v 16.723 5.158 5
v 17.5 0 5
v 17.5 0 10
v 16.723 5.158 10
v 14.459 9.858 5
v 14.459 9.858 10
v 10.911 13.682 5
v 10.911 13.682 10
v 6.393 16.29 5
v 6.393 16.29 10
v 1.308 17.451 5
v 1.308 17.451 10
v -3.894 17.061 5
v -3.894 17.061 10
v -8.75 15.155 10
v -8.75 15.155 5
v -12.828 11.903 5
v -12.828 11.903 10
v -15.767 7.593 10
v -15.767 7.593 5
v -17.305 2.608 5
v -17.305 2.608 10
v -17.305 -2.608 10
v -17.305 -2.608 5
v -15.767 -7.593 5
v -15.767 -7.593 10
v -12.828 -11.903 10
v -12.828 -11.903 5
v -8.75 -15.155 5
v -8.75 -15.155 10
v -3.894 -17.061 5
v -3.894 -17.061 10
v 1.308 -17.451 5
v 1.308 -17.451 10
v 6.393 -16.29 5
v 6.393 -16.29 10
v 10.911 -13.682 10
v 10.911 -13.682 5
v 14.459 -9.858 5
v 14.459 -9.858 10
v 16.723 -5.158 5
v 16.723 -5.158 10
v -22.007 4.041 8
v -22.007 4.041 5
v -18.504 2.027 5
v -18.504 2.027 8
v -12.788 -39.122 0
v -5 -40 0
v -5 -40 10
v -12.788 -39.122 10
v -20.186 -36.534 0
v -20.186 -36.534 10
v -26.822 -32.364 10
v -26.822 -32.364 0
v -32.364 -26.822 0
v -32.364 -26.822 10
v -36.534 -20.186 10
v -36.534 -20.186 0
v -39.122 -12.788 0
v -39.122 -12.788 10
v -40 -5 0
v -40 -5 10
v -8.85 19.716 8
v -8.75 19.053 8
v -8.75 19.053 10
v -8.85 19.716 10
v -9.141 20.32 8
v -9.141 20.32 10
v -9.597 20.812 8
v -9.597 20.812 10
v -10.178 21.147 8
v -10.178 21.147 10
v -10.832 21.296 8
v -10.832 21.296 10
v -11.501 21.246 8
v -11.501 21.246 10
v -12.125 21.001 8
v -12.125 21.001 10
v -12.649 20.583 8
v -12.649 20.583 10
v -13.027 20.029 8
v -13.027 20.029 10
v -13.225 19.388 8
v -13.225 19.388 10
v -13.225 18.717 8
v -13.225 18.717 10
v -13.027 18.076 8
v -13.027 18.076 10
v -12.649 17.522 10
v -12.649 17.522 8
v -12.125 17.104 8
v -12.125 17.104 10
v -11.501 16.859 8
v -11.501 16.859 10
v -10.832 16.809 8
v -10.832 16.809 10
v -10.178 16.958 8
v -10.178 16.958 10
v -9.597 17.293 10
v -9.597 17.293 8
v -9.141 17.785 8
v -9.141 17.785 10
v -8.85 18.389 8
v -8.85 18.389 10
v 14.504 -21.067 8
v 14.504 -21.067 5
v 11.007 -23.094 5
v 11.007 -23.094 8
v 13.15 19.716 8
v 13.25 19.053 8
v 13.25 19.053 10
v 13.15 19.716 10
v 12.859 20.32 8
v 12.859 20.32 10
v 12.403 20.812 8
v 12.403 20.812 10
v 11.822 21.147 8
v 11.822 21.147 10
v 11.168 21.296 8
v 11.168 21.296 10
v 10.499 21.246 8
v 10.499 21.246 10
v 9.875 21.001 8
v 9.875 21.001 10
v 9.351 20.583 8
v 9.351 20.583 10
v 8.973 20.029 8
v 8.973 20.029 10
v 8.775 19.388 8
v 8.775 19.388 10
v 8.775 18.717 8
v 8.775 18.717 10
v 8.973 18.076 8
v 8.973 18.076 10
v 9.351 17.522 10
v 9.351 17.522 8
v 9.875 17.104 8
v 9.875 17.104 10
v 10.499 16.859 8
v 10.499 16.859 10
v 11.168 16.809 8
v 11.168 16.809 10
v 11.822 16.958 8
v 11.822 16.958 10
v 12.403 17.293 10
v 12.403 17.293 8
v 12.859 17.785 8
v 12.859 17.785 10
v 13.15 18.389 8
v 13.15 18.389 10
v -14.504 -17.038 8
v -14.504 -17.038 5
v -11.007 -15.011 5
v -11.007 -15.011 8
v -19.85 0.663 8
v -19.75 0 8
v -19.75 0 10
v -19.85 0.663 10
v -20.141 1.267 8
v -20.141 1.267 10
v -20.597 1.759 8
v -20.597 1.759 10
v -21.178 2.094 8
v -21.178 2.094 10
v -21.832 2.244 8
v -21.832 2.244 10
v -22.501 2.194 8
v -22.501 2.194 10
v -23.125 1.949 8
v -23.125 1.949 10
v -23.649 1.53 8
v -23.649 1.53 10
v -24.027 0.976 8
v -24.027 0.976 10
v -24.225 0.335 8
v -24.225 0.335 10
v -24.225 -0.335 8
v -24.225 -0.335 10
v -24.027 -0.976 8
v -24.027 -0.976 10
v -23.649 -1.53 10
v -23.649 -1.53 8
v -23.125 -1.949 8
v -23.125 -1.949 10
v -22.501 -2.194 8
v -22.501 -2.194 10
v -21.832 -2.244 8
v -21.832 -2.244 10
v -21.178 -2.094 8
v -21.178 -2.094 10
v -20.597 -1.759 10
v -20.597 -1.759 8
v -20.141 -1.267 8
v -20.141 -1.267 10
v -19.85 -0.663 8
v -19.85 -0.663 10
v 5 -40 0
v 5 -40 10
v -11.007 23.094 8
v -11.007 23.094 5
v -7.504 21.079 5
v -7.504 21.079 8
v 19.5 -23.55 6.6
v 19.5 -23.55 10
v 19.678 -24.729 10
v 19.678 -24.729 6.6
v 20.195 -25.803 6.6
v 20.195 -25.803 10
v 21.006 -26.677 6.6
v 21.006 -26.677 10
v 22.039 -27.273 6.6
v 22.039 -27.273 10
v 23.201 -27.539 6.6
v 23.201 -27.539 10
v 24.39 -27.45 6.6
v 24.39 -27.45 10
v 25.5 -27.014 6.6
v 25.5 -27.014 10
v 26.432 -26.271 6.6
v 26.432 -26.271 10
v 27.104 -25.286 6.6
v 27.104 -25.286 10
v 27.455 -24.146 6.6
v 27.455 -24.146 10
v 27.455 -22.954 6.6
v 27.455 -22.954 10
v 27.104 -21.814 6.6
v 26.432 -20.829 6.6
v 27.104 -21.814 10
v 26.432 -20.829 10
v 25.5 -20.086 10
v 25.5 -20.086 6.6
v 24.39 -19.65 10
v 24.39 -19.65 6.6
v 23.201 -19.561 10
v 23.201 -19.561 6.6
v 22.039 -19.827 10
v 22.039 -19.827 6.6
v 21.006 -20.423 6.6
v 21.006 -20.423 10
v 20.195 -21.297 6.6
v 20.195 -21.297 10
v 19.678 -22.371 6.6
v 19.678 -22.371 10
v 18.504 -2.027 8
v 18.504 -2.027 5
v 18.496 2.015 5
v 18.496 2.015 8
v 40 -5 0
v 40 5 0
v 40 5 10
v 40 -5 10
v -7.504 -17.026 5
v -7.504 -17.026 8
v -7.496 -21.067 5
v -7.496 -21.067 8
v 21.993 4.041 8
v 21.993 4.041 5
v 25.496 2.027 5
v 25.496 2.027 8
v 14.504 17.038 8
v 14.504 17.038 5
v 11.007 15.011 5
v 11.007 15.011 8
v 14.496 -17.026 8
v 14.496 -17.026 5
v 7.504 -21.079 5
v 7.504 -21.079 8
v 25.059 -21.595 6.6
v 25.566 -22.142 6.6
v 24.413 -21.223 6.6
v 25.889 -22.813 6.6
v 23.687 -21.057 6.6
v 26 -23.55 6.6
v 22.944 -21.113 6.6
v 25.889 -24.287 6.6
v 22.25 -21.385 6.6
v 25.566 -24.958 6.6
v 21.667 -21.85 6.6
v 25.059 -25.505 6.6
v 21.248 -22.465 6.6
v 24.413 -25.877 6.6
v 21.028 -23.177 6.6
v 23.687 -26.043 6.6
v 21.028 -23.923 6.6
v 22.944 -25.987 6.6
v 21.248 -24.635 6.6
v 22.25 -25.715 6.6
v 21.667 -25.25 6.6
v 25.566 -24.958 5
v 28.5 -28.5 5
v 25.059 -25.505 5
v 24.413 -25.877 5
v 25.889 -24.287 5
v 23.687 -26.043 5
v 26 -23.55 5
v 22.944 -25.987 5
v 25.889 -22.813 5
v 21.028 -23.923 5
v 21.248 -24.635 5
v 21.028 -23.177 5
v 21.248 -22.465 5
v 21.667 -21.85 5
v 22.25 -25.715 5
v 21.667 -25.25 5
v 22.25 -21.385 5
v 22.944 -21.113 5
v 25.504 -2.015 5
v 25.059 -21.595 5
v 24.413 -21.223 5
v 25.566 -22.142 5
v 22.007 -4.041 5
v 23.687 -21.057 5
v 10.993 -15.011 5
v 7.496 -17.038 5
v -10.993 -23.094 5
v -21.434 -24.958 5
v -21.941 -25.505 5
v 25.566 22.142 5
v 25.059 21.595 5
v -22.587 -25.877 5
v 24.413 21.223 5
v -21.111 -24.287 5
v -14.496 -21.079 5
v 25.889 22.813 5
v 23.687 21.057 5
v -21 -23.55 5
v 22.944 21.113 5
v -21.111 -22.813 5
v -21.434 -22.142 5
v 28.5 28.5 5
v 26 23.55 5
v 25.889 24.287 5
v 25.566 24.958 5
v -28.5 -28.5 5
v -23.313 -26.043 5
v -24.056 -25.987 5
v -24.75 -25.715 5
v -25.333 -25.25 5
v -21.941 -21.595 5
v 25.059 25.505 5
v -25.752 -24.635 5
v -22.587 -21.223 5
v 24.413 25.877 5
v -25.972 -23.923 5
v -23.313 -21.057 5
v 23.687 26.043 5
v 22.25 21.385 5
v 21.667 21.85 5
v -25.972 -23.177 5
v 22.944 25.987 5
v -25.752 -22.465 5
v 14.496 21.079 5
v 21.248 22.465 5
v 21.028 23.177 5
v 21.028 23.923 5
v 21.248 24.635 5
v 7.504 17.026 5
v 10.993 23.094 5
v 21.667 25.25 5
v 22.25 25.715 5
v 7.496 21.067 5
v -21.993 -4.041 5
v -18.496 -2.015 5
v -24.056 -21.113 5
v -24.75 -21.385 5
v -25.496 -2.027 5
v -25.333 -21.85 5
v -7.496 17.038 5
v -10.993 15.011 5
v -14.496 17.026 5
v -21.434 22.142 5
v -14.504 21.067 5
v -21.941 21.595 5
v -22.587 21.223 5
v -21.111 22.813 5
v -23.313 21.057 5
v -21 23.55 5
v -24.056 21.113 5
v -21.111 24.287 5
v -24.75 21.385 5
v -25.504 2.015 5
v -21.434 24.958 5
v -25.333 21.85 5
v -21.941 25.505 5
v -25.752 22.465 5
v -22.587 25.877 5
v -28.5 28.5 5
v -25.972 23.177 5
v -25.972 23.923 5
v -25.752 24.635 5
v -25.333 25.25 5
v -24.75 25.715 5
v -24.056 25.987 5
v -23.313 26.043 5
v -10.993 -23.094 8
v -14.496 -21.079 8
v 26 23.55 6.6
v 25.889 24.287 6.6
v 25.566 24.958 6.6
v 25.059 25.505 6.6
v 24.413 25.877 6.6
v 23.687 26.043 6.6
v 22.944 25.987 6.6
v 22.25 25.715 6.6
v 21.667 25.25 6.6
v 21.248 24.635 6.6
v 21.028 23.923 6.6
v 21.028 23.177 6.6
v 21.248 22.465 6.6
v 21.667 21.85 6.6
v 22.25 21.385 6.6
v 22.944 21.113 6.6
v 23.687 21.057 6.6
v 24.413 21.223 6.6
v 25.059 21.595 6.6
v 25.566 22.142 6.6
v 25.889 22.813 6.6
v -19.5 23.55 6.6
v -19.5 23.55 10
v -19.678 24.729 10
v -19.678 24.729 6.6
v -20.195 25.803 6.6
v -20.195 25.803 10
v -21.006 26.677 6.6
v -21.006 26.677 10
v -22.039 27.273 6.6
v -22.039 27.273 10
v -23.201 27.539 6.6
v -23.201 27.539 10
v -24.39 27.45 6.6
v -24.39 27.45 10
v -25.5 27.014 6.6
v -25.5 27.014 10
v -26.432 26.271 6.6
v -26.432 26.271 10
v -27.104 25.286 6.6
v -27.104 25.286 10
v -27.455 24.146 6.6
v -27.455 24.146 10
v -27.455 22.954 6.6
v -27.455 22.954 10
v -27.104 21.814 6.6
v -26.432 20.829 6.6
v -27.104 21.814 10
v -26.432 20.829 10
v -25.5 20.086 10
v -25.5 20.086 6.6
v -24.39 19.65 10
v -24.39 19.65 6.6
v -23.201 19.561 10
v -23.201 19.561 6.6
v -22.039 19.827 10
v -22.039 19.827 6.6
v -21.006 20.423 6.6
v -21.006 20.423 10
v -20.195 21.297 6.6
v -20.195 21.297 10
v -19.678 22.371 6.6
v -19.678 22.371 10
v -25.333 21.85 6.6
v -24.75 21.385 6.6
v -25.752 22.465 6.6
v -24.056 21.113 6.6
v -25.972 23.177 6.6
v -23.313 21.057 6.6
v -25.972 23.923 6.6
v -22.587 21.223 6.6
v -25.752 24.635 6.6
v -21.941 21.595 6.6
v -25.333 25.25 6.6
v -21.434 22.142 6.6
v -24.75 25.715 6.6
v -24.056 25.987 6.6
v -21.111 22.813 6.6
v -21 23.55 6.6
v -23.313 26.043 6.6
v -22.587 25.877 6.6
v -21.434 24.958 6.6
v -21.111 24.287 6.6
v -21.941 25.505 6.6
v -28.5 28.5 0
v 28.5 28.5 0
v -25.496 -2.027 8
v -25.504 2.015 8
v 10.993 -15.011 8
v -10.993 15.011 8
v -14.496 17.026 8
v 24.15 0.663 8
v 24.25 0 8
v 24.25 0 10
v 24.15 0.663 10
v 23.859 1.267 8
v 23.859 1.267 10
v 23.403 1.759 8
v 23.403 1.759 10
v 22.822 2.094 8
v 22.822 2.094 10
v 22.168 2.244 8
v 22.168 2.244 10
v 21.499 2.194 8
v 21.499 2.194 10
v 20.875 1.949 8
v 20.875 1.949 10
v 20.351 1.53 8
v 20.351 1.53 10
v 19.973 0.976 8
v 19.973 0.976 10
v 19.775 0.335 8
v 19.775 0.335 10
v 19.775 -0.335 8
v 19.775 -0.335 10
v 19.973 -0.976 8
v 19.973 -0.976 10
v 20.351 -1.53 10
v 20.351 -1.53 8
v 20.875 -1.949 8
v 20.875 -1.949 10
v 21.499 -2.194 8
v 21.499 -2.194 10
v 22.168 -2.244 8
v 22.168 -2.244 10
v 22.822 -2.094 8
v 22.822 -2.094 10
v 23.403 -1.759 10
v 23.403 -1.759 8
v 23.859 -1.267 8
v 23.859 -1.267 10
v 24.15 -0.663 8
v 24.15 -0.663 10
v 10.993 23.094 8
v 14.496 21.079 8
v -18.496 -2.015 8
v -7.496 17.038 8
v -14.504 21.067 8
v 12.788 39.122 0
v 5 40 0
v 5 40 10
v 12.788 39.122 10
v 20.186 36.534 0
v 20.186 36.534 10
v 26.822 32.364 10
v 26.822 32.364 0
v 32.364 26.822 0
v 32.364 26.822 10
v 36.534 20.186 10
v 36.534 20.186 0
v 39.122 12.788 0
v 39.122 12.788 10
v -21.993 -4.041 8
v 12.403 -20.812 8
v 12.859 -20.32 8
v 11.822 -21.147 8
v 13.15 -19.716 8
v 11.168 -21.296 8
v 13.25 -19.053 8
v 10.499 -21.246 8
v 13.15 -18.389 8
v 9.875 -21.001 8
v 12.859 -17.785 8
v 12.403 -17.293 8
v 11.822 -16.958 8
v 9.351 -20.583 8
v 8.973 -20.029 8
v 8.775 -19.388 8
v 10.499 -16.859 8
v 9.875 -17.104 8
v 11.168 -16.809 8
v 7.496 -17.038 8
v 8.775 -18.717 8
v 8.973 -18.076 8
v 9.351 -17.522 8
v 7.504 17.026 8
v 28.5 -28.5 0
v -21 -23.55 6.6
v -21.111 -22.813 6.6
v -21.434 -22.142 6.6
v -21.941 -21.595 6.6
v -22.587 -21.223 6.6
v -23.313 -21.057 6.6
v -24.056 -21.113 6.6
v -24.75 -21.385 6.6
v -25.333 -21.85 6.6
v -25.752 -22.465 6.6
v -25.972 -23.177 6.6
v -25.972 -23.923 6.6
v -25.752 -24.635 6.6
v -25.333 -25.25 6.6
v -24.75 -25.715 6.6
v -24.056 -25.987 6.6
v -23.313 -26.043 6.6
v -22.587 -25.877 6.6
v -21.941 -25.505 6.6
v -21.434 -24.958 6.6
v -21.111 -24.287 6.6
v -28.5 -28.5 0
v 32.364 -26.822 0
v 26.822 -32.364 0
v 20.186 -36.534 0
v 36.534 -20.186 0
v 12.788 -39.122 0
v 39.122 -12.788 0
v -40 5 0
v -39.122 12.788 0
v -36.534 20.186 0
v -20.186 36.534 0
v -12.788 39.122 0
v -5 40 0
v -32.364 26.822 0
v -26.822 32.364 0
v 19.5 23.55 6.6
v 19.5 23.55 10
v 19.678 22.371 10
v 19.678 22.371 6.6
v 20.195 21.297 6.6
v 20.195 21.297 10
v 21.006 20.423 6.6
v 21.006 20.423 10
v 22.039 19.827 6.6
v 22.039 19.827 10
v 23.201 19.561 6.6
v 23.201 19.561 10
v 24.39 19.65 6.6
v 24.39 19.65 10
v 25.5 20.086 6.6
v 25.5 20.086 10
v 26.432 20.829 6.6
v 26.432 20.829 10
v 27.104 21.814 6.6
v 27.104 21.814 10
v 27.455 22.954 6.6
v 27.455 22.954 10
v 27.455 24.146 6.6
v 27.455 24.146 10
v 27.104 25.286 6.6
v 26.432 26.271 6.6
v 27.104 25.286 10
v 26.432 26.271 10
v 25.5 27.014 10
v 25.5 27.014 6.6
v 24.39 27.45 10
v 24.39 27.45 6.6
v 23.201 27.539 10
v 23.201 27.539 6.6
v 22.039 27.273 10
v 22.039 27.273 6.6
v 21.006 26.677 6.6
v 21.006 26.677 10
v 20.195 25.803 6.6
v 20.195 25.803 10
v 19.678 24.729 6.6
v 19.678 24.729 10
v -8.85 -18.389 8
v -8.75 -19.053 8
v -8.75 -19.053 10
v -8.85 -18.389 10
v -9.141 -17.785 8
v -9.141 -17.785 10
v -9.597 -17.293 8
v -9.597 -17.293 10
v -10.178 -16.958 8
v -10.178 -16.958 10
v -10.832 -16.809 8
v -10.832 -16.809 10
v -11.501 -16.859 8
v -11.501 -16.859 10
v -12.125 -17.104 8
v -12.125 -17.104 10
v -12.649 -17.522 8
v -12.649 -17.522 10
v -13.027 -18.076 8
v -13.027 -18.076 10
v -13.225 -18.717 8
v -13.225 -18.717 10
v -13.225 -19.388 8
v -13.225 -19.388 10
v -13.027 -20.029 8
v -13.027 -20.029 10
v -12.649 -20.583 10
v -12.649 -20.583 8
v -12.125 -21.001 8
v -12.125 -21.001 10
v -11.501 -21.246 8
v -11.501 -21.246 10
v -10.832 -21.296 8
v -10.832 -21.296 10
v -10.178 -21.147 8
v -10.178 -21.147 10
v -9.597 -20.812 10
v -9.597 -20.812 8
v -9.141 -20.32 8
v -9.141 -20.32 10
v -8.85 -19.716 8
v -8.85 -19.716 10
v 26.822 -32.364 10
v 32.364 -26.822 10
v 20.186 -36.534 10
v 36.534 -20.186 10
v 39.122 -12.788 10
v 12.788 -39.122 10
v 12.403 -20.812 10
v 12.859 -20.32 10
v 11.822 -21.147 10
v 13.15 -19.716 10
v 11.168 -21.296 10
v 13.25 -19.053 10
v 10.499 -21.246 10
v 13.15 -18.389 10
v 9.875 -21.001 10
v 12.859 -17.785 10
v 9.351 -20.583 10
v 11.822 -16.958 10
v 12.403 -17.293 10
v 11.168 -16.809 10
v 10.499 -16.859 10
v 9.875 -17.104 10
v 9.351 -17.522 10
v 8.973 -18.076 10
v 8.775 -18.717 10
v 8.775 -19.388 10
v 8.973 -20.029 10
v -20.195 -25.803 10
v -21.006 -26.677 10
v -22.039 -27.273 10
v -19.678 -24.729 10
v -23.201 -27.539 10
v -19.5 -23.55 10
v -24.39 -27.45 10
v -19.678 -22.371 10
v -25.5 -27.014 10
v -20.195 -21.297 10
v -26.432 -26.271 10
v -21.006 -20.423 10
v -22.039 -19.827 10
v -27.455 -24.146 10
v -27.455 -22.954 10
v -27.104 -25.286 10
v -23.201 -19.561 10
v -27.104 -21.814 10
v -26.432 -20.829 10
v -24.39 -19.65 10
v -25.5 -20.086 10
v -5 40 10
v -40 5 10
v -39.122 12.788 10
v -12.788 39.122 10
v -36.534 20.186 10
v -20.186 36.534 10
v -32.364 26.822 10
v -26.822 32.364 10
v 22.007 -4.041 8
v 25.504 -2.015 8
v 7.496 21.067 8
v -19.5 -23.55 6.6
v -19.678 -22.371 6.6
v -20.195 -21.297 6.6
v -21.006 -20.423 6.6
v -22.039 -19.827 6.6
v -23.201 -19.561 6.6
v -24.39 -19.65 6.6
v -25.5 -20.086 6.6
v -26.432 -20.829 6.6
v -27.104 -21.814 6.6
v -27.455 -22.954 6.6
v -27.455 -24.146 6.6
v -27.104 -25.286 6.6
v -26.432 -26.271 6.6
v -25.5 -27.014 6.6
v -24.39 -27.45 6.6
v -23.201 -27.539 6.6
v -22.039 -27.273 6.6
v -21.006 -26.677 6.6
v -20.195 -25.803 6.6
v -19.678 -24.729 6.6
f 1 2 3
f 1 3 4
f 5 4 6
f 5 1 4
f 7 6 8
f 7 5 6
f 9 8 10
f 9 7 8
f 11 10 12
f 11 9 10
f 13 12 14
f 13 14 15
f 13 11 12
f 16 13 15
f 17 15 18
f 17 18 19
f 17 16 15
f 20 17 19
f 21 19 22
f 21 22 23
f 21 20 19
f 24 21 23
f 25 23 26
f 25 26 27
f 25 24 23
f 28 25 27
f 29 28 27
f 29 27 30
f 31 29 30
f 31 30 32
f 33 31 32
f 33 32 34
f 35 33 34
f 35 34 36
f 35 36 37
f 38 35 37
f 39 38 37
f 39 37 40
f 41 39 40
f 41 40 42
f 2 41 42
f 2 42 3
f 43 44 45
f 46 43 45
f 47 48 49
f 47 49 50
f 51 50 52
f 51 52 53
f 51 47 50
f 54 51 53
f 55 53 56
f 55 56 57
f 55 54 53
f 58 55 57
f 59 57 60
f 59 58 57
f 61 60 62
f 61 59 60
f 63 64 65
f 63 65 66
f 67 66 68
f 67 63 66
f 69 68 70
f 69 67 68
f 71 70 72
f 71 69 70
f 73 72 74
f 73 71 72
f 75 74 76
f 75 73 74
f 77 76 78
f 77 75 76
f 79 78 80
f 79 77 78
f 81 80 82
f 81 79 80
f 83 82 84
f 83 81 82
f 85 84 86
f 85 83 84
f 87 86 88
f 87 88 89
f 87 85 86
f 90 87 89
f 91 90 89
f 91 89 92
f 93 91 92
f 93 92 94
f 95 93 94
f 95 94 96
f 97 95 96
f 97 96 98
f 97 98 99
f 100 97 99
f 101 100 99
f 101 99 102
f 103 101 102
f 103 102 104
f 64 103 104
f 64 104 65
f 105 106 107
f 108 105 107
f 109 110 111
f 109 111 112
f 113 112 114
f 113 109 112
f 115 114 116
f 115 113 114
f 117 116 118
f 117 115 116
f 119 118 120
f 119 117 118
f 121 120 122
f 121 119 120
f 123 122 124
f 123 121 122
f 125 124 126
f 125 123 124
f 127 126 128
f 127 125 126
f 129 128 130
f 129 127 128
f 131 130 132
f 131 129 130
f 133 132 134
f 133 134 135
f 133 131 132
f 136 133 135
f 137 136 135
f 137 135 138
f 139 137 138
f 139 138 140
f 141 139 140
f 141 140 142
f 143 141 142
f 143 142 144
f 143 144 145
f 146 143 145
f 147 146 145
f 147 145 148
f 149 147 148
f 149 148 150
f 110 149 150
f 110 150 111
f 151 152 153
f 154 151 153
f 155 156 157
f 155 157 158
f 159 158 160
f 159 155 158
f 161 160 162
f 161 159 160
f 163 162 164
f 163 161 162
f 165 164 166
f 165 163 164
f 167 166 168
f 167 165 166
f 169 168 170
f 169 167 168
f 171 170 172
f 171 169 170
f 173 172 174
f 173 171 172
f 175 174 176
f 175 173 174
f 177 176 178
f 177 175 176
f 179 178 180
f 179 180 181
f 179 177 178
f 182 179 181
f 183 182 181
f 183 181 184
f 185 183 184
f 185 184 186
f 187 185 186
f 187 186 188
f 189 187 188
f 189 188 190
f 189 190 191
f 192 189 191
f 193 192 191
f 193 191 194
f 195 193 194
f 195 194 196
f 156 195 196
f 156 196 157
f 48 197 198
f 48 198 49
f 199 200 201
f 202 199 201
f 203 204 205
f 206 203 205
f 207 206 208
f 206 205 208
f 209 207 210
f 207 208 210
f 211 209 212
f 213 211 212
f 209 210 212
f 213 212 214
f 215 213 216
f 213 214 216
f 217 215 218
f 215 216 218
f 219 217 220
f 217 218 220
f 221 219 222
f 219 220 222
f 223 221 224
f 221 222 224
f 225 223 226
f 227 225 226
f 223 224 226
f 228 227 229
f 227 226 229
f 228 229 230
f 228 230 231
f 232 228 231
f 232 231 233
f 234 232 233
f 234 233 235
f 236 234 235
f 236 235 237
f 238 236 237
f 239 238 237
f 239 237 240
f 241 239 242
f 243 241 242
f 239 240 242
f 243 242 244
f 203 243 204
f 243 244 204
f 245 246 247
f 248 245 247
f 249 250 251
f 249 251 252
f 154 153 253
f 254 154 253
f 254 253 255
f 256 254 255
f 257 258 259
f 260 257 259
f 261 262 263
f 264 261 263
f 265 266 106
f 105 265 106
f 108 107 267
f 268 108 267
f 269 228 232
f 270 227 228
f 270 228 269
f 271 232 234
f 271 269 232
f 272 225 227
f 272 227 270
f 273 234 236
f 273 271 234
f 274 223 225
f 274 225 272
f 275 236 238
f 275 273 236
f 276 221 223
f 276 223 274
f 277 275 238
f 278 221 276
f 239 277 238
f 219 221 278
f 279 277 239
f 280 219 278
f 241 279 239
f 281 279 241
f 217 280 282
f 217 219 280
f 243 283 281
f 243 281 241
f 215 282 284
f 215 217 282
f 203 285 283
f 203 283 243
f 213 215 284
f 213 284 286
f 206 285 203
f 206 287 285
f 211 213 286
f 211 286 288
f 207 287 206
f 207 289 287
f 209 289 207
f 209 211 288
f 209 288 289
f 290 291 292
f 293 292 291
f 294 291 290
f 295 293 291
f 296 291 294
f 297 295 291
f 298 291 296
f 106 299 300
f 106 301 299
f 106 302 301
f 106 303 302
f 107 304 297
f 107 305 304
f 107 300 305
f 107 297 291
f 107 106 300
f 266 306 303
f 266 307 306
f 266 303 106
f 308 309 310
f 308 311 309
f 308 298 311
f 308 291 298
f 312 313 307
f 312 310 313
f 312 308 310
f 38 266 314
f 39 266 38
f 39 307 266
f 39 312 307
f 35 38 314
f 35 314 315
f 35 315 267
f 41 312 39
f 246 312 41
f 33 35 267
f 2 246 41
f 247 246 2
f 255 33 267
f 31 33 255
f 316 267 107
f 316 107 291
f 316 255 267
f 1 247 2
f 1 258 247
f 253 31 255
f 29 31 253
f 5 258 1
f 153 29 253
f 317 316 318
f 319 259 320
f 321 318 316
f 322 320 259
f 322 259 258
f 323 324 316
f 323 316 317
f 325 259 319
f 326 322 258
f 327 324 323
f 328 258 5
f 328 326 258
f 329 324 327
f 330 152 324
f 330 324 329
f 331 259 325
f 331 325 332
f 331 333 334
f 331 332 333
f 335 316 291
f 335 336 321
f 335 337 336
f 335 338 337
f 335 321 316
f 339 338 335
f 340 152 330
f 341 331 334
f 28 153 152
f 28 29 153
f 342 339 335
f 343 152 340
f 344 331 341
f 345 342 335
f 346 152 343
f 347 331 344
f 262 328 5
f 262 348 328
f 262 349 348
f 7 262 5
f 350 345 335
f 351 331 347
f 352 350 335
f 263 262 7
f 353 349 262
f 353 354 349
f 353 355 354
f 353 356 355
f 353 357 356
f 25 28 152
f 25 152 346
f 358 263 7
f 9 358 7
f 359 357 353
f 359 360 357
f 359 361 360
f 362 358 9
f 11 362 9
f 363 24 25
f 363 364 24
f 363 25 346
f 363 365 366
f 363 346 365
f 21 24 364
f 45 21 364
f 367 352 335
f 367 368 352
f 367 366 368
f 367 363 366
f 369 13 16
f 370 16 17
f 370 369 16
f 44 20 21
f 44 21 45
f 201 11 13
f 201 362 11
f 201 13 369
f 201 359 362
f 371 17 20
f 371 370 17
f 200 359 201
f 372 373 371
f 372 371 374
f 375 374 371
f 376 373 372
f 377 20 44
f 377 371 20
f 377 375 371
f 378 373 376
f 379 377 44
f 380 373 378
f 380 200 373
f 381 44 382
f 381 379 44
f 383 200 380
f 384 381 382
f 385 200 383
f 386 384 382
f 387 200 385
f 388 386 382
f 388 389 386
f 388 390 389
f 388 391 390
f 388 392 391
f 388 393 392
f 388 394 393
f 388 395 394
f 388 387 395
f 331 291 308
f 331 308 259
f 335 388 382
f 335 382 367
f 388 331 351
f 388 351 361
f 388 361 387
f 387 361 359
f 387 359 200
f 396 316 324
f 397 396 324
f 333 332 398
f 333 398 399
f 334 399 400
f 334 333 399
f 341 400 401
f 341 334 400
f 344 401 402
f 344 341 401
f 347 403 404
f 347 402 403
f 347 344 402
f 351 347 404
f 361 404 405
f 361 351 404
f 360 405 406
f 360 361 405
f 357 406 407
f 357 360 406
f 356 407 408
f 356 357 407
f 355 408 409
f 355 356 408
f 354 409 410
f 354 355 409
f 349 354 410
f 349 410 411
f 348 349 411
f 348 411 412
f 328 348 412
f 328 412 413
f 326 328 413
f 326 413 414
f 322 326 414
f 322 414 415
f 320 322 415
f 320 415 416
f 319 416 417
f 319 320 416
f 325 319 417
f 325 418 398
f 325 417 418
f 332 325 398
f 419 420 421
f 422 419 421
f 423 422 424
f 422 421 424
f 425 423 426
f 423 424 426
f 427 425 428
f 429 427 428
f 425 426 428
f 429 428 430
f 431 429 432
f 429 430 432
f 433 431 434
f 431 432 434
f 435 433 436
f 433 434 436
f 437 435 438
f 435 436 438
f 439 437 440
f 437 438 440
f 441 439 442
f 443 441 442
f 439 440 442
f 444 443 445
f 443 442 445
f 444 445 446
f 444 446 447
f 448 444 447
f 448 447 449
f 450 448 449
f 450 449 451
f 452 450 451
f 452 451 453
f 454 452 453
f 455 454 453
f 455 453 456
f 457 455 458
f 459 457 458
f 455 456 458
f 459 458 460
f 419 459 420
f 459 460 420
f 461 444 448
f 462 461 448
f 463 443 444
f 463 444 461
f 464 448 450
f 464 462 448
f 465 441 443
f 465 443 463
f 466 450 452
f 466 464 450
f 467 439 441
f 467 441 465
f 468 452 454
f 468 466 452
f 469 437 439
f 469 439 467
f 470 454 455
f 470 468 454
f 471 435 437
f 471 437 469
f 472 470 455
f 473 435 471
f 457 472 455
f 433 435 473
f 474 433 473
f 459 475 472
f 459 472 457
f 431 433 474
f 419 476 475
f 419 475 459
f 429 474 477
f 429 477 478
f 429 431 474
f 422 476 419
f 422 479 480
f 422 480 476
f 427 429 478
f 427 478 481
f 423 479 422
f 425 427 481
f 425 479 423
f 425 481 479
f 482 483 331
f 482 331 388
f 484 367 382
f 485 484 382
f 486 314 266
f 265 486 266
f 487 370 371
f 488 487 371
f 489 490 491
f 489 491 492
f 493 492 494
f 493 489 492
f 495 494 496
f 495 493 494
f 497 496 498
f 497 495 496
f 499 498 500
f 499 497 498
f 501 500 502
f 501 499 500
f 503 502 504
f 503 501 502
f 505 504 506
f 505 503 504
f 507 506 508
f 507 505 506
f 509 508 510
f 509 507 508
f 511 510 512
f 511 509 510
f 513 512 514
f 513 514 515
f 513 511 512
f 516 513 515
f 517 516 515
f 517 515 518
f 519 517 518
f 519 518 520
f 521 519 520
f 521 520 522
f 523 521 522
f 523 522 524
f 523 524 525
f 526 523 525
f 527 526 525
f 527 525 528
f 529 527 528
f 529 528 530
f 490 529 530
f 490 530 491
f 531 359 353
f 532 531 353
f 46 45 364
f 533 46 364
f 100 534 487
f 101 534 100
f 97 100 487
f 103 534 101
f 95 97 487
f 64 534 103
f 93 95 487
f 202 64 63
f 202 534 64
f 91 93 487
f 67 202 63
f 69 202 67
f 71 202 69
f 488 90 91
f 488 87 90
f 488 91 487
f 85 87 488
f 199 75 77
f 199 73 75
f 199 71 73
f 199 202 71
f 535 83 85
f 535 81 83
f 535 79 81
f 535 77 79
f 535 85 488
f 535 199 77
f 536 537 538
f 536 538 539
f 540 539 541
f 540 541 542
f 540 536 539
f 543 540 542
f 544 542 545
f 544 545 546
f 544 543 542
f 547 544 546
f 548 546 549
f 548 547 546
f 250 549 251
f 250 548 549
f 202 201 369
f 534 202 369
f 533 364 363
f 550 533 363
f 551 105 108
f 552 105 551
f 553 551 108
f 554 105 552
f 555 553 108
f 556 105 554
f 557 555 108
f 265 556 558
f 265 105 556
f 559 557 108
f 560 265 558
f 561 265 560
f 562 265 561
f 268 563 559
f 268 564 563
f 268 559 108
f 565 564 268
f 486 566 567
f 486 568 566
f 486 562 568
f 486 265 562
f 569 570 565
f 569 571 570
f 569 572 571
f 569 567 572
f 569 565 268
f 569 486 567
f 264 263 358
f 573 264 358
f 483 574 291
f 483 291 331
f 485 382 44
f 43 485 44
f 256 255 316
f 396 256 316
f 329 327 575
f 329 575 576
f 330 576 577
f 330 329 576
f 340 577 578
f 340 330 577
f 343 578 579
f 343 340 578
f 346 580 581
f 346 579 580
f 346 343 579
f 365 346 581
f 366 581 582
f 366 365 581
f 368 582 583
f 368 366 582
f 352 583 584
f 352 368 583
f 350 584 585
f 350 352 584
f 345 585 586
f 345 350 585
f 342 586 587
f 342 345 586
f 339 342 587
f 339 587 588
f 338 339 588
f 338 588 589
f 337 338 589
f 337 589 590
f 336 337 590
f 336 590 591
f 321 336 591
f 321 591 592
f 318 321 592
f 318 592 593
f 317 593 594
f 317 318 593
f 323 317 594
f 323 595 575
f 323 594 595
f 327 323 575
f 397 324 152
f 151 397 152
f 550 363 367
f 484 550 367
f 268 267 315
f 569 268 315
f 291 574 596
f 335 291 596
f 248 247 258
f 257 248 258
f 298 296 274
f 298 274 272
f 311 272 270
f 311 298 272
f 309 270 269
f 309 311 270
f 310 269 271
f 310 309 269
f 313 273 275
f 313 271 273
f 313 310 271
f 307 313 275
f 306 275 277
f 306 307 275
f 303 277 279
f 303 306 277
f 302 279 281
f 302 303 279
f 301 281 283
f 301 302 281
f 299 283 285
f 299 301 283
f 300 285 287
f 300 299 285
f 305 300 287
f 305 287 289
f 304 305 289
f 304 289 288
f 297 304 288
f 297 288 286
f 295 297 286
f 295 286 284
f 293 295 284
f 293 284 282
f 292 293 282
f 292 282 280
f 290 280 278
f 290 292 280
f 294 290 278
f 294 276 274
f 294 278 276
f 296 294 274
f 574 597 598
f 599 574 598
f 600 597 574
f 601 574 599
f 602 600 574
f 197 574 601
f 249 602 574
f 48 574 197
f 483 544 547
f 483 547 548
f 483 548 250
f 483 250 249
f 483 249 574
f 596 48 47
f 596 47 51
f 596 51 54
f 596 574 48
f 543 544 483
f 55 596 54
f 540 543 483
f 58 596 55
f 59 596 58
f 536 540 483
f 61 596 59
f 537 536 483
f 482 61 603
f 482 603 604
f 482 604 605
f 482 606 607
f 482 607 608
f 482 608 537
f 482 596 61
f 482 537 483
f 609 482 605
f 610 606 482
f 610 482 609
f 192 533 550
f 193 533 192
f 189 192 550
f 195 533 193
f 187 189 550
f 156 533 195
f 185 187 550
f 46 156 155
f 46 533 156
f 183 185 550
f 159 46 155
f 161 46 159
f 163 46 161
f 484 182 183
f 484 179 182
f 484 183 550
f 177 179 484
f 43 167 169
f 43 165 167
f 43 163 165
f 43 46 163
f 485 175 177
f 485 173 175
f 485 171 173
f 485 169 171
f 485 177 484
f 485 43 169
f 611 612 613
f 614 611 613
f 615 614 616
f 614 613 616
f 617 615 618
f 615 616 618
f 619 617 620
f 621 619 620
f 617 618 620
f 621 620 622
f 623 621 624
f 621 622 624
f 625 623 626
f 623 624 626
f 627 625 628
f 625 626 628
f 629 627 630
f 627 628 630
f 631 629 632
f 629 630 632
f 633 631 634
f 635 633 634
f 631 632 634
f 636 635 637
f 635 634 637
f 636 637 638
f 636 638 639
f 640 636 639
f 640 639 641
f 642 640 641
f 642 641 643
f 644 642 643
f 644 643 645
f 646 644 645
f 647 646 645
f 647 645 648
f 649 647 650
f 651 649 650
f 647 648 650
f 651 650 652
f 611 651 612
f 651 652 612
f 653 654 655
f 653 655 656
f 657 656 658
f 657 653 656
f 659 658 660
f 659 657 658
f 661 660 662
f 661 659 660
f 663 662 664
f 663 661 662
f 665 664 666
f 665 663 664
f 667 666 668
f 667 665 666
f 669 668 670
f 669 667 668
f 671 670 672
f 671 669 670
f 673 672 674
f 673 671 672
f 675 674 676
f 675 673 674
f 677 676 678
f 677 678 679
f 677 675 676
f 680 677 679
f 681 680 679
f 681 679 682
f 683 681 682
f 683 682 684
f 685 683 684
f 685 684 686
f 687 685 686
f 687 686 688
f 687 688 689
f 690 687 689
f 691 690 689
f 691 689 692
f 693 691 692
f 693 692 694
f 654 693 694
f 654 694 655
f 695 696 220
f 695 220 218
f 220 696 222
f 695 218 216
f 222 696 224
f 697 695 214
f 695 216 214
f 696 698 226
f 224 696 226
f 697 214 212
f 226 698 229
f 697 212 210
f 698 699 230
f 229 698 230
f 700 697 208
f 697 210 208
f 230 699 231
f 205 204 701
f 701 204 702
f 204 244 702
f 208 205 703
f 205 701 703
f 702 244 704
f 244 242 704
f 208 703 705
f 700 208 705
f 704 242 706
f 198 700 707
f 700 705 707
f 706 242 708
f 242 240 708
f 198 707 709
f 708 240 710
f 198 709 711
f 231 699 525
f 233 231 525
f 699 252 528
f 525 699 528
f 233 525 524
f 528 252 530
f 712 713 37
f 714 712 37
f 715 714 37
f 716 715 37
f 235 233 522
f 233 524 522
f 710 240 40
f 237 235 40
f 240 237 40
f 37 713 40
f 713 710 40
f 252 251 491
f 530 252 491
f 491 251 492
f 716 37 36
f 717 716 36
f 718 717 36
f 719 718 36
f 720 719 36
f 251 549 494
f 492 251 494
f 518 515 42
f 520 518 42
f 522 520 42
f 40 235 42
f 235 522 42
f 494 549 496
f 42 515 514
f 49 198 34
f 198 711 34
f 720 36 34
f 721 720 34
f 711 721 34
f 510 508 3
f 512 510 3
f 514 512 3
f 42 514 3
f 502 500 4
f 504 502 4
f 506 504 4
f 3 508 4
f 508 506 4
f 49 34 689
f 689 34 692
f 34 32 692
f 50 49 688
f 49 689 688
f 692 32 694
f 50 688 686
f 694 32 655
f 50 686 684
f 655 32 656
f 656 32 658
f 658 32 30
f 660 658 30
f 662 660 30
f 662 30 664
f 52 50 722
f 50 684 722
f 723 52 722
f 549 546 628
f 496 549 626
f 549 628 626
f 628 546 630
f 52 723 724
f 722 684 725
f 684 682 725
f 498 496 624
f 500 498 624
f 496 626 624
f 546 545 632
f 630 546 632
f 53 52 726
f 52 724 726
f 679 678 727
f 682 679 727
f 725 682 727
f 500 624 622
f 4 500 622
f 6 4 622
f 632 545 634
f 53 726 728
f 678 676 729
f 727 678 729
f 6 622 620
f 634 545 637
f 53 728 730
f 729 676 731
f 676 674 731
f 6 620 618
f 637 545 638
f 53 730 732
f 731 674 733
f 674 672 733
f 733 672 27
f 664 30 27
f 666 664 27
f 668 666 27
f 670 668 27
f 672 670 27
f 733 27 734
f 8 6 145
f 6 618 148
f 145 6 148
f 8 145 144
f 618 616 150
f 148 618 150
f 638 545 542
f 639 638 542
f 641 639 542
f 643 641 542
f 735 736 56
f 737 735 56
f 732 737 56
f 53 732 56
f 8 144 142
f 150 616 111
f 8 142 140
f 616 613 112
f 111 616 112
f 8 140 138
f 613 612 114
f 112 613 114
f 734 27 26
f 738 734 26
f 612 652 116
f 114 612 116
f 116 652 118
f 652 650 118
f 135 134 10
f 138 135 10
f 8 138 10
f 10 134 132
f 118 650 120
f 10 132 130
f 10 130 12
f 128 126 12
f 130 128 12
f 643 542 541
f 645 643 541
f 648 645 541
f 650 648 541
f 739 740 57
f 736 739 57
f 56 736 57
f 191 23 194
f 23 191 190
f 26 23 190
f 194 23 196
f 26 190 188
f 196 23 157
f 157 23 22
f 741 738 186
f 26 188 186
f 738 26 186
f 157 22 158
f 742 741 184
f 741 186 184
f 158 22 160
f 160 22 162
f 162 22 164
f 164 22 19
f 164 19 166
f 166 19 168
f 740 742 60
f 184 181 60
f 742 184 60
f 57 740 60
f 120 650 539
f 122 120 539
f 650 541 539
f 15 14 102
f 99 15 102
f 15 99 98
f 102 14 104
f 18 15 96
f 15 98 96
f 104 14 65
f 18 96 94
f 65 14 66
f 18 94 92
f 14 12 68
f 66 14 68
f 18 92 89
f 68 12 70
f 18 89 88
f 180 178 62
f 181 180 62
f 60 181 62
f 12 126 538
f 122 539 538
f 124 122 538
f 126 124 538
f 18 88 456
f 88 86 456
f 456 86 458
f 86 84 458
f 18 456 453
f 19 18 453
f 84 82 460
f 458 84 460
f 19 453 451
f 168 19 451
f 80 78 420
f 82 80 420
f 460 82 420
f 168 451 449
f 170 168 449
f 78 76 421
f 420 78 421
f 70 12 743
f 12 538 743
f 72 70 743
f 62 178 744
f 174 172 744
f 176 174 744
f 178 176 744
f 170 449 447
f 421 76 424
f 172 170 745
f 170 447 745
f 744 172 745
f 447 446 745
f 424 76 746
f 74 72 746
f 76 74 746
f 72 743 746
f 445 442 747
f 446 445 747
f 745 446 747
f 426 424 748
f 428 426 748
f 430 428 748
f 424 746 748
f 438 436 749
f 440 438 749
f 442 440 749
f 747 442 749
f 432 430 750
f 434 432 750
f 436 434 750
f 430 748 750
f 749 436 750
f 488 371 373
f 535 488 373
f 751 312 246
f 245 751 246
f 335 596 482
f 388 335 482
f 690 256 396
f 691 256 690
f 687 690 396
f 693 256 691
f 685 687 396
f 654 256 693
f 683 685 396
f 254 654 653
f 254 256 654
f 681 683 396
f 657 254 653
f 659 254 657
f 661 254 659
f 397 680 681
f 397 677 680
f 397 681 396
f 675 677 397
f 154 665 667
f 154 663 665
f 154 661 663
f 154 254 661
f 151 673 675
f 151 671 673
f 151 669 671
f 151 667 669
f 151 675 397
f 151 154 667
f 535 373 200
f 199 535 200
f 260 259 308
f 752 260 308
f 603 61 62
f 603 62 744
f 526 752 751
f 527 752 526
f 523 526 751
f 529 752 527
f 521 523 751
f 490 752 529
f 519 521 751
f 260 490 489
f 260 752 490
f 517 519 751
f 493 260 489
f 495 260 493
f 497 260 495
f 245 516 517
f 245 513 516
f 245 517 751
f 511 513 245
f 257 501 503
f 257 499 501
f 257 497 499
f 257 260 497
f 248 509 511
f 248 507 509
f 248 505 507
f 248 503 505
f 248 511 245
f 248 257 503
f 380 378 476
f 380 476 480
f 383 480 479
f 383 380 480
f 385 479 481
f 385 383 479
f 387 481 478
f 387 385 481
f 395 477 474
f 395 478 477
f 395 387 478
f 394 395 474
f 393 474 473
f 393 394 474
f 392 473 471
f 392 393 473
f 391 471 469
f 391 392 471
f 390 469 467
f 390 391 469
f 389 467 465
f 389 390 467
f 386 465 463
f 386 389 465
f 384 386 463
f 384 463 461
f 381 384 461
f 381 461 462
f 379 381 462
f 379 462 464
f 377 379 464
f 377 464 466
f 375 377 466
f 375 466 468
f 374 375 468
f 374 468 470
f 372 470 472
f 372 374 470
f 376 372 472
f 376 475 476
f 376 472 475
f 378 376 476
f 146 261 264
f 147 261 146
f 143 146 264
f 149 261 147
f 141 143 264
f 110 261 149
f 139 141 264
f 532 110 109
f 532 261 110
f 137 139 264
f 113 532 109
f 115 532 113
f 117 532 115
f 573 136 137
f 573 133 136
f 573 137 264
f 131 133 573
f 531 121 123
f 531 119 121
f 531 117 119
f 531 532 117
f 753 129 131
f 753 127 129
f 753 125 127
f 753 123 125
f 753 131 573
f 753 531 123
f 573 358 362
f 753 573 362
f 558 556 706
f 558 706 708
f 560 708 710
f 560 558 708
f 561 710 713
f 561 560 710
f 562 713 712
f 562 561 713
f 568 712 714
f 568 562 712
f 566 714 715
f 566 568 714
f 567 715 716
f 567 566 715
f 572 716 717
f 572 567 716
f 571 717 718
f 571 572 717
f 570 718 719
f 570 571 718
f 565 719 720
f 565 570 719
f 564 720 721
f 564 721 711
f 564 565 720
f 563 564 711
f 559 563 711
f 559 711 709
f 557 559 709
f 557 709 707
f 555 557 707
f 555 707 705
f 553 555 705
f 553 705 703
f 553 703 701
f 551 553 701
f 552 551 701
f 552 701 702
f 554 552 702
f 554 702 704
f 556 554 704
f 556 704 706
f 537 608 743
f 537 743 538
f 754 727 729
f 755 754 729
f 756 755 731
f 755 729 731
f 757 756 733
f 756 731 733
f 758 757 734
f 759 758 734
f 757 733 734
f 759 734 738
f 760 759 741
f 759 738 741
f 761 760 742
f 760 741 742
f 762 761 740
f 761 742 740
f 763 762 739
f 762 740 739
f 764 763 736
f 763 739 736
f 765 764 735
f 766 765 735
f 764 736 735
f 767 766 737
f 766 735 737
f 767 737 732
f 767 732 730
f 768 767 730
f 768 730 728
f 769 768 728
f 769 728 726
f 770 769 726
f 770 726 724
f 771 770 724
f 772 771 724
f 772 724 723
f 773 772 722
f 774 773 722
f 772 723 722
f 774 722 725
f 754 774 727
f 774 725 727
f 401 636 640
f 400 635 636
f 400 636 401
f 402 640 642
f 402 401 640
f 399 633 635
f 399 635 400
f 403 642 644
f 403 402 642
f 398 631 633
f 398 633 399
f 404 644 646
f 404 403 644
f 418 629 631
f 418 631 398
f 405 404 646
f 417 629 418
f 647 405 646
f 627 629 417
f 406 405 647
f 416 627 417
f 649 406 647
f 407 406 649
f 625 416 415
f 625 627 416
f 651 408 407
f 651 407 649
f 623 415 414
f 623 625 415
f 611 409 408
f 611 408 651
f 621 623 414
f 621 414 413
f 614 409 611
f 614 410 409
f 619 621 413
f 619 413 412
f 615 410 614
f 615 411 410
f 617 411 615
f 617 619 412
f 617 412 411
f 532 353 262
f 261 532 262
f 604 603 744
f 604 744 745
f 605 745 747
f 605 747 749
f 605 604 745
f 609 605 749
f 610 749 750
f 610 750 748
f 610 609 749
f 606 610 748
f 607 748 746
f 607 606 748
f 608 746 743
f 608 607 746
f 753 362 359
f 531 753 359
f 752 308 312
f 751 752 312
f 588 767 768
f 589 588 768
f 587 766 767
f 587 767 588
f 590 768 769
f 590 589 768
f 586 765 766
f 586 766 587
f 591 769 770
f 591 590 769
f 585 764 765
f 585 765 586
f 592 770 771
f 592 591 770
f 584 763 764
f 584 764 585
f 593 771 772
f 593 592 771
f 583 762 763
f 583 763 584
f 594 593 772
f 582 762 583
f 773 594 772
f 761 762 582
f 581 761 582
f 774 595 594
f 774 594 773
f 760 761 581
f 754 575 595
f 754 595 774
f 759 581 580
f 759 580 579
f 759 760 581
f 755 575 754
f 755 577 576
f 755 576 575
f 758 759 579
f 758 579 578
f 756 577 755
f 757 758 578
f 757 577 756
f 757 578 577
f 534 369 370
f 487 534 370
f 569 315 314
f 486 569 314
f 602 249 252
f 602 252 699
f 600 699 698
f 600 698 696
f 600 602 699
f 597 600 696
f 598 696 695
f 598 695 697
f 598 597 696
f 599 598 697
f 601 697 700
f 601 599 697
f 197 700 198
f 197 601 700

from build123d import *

# Parameters (mm, degrees)
ESQUISSE1_R             = 2.25
ESQUISSE1_R_2           = 2.5
ESQUISSE1_R_3           = 17.5
BOSS_EXTRU_1_DEPTH      = 10
ESQUISSE2_W             = 57
ESQUISSE2_H             = 57
ENL_V_MAT_EXTRU_2_DEPTH = 5
ENL_V_MAT_EXTRU_3_DEPTH = 3
ESQUISSE5_R             = 4
ENL_V_MAT_EXTRU_4_DEPTH = 3.4


with BuildPart() as part:
    # Esquisse1 → Boss.-Extru.1 (new body)
    with BuildSketch(Plane.XY):
        with BuildLine():
            Line((5, -40), (-5, -40))
            ThreePointArc((-5, -40), (-29.748737342, -29.748737342), (-40, -5))
            Line((-40, -5), (-40, 5))
            ThreePointArc((-40, 5), (-29.748737342, 29.748737342), (-5, 40))
            Line((-5, 40), (5, 40))
            ThreePointArc((5, 40), (29.748737342, 29.748737342), (40, 5))
            Line((40, 5), (40, -5))
            ThreePointArc((40, -5), (29.748737342, -29.748737342), (5, -40))
        make_face()
        with Locations((22, 0)):
            Circle(ESQUISSE1_R, mode=Mode.SUBTRACT)
        with Locations((11, -19.052558883)):
            Circle(ESQUISSE1_R, mode=Mode.SUBTRACT)
        with Locations((-11, -19.052558883)):
            Circle(ESQUISSE1_R, mode=Mode.SUBTRACT)
        with Locations((-22, 0)):
            Circle(ESQUISSE1_R, mode=Mode.SUBTRACT)
        with Locations((-11, 19.052558883)):
            Circle(ESQUISSE1_R, mode=Mode.SUBTRACT)
        with Locations((11, 19.052558883)):
            Circle(ESQUISSE1_R, mode=Mode.SUBTRACT)
        with Locations((-23.5, 23.55)):
            Circle(ESQUISSE1_R_2, mode=Mode.SUBTRACT)
        with Locations((23.5, 23.55)):
            Circle(ESQUISSE1_R_2, mode=Mode.SUBTRACT)
        with Locations((23.5, -23.55)):
            Circle(ESQUISSE1_R_2, mode=Mode.SUBTRACT)
        with Locations((-23.5, -23.55)):
            Circle(ESQUISSE1_R_2, mode=Mode.SUBTRACT)
        Circle(ESQUISSE1_R_3, mode=Mode.SUBTRACT)
    extrude(amount=BOSS_EXTRU_1_DEPTH)

    # Esquisse2 → Enlèv. mat.-Extru.2 (cut)
    with BuildSketch(Plane(origin=(0, 0, 0), x_dir=(-1, 0, 0), z_dir=(0, 0, -1))):
        Rectangle(ESQUISSE2_W, ESQUISSE2_H)
    extrude(amount=-ENL_V_MAT_EXTRU_2_DEPTH, mode=Mode.SUBTRACT)

    # Esquisse4 → Enlèv. mat.-Extru.3 (cut)
    with BuildSketch(Plane(origin=(0, 0, 5), x_dir=(-1, 0, 0), z_dir=(0, 0, -1))):
        Polygon((-7.496491289, 21.067207559), (-10.992982578, 23.094010768), (-14.496491289, 21.079362091), (-14.503508711, 17.037910207), (-11.007017422, 15.011106999), (-7.503508711, 17.025755675), align=None)
        Polygon((14.496491289, 17.025755675), (14.503508711, 21.067207559), (11.007017422, 23.094010768), (7.503508711, 21.079362091), (7.496491289, 17.037910207), (10.992982578, 15.011106999), align=None)
        Polygon((21.992982578, -4.041451884), (25.496491289, -2.026803208), (25.503508711, 2.014648676), (22.007017422, 4.041451884), (18.503508711, 2.026803208), (18.496491289, -2.014648676), align=None)
        Polygon((7.496491289, -21.067207559), (10.992982578, -23.094010768), (14.496491289, -21.079362091), (14.503508711, -17.037910207), (11.007017422, -15.011106999), (7.503508711, -17.025755675), align=None)
        Polygon((-14.496491289, -17.025755675), (-14.503508711, -21.067207559), (-11.007017422, -23.094010768), (-7.503508711, -21.079362091), (-7.496491289, -17.037910207), (-10.992982578, -15.011106999), align=None)
        Polygon((-21.992982578, 4.041451884), (-25.496491289, 2.026803208), (-25.503508711, -2.014648676), (-22.007017422, -4.041451884), (-18.503508711, -2.026803208), (-18.496491289, 2.014648676), align=None)
    extrude(amount=-ENL_V_MAT_EXTRU_3_DEPTH, mode=Mode.SUBTRACT)

    # Esquisse5 → Enlèv. mat.-Extru.4 (cut)
    with BuildSketch(Plane.XY.offset(10)):
        with Locations((-23.5, 23.55)):
            Circle(ESQUISSE5_R)
        with Locations((-23.5, -23.55)):
            Circle(ESQUISSE5_R)
        with Locations(Location((23.5, 23.55, 0), (0, 0, 180))):
            Circle(ESQUISSE5_R)
        with Locations(Location((23.5, -23.55, 0), (0, 0, 180))):
            Circle(ESQUISSE5_R)
    extrude(amount=-ENL_V_MAT_EXTRU_4_DEPTH, mode=Mode.SUBTRACT)


solid = part.part
